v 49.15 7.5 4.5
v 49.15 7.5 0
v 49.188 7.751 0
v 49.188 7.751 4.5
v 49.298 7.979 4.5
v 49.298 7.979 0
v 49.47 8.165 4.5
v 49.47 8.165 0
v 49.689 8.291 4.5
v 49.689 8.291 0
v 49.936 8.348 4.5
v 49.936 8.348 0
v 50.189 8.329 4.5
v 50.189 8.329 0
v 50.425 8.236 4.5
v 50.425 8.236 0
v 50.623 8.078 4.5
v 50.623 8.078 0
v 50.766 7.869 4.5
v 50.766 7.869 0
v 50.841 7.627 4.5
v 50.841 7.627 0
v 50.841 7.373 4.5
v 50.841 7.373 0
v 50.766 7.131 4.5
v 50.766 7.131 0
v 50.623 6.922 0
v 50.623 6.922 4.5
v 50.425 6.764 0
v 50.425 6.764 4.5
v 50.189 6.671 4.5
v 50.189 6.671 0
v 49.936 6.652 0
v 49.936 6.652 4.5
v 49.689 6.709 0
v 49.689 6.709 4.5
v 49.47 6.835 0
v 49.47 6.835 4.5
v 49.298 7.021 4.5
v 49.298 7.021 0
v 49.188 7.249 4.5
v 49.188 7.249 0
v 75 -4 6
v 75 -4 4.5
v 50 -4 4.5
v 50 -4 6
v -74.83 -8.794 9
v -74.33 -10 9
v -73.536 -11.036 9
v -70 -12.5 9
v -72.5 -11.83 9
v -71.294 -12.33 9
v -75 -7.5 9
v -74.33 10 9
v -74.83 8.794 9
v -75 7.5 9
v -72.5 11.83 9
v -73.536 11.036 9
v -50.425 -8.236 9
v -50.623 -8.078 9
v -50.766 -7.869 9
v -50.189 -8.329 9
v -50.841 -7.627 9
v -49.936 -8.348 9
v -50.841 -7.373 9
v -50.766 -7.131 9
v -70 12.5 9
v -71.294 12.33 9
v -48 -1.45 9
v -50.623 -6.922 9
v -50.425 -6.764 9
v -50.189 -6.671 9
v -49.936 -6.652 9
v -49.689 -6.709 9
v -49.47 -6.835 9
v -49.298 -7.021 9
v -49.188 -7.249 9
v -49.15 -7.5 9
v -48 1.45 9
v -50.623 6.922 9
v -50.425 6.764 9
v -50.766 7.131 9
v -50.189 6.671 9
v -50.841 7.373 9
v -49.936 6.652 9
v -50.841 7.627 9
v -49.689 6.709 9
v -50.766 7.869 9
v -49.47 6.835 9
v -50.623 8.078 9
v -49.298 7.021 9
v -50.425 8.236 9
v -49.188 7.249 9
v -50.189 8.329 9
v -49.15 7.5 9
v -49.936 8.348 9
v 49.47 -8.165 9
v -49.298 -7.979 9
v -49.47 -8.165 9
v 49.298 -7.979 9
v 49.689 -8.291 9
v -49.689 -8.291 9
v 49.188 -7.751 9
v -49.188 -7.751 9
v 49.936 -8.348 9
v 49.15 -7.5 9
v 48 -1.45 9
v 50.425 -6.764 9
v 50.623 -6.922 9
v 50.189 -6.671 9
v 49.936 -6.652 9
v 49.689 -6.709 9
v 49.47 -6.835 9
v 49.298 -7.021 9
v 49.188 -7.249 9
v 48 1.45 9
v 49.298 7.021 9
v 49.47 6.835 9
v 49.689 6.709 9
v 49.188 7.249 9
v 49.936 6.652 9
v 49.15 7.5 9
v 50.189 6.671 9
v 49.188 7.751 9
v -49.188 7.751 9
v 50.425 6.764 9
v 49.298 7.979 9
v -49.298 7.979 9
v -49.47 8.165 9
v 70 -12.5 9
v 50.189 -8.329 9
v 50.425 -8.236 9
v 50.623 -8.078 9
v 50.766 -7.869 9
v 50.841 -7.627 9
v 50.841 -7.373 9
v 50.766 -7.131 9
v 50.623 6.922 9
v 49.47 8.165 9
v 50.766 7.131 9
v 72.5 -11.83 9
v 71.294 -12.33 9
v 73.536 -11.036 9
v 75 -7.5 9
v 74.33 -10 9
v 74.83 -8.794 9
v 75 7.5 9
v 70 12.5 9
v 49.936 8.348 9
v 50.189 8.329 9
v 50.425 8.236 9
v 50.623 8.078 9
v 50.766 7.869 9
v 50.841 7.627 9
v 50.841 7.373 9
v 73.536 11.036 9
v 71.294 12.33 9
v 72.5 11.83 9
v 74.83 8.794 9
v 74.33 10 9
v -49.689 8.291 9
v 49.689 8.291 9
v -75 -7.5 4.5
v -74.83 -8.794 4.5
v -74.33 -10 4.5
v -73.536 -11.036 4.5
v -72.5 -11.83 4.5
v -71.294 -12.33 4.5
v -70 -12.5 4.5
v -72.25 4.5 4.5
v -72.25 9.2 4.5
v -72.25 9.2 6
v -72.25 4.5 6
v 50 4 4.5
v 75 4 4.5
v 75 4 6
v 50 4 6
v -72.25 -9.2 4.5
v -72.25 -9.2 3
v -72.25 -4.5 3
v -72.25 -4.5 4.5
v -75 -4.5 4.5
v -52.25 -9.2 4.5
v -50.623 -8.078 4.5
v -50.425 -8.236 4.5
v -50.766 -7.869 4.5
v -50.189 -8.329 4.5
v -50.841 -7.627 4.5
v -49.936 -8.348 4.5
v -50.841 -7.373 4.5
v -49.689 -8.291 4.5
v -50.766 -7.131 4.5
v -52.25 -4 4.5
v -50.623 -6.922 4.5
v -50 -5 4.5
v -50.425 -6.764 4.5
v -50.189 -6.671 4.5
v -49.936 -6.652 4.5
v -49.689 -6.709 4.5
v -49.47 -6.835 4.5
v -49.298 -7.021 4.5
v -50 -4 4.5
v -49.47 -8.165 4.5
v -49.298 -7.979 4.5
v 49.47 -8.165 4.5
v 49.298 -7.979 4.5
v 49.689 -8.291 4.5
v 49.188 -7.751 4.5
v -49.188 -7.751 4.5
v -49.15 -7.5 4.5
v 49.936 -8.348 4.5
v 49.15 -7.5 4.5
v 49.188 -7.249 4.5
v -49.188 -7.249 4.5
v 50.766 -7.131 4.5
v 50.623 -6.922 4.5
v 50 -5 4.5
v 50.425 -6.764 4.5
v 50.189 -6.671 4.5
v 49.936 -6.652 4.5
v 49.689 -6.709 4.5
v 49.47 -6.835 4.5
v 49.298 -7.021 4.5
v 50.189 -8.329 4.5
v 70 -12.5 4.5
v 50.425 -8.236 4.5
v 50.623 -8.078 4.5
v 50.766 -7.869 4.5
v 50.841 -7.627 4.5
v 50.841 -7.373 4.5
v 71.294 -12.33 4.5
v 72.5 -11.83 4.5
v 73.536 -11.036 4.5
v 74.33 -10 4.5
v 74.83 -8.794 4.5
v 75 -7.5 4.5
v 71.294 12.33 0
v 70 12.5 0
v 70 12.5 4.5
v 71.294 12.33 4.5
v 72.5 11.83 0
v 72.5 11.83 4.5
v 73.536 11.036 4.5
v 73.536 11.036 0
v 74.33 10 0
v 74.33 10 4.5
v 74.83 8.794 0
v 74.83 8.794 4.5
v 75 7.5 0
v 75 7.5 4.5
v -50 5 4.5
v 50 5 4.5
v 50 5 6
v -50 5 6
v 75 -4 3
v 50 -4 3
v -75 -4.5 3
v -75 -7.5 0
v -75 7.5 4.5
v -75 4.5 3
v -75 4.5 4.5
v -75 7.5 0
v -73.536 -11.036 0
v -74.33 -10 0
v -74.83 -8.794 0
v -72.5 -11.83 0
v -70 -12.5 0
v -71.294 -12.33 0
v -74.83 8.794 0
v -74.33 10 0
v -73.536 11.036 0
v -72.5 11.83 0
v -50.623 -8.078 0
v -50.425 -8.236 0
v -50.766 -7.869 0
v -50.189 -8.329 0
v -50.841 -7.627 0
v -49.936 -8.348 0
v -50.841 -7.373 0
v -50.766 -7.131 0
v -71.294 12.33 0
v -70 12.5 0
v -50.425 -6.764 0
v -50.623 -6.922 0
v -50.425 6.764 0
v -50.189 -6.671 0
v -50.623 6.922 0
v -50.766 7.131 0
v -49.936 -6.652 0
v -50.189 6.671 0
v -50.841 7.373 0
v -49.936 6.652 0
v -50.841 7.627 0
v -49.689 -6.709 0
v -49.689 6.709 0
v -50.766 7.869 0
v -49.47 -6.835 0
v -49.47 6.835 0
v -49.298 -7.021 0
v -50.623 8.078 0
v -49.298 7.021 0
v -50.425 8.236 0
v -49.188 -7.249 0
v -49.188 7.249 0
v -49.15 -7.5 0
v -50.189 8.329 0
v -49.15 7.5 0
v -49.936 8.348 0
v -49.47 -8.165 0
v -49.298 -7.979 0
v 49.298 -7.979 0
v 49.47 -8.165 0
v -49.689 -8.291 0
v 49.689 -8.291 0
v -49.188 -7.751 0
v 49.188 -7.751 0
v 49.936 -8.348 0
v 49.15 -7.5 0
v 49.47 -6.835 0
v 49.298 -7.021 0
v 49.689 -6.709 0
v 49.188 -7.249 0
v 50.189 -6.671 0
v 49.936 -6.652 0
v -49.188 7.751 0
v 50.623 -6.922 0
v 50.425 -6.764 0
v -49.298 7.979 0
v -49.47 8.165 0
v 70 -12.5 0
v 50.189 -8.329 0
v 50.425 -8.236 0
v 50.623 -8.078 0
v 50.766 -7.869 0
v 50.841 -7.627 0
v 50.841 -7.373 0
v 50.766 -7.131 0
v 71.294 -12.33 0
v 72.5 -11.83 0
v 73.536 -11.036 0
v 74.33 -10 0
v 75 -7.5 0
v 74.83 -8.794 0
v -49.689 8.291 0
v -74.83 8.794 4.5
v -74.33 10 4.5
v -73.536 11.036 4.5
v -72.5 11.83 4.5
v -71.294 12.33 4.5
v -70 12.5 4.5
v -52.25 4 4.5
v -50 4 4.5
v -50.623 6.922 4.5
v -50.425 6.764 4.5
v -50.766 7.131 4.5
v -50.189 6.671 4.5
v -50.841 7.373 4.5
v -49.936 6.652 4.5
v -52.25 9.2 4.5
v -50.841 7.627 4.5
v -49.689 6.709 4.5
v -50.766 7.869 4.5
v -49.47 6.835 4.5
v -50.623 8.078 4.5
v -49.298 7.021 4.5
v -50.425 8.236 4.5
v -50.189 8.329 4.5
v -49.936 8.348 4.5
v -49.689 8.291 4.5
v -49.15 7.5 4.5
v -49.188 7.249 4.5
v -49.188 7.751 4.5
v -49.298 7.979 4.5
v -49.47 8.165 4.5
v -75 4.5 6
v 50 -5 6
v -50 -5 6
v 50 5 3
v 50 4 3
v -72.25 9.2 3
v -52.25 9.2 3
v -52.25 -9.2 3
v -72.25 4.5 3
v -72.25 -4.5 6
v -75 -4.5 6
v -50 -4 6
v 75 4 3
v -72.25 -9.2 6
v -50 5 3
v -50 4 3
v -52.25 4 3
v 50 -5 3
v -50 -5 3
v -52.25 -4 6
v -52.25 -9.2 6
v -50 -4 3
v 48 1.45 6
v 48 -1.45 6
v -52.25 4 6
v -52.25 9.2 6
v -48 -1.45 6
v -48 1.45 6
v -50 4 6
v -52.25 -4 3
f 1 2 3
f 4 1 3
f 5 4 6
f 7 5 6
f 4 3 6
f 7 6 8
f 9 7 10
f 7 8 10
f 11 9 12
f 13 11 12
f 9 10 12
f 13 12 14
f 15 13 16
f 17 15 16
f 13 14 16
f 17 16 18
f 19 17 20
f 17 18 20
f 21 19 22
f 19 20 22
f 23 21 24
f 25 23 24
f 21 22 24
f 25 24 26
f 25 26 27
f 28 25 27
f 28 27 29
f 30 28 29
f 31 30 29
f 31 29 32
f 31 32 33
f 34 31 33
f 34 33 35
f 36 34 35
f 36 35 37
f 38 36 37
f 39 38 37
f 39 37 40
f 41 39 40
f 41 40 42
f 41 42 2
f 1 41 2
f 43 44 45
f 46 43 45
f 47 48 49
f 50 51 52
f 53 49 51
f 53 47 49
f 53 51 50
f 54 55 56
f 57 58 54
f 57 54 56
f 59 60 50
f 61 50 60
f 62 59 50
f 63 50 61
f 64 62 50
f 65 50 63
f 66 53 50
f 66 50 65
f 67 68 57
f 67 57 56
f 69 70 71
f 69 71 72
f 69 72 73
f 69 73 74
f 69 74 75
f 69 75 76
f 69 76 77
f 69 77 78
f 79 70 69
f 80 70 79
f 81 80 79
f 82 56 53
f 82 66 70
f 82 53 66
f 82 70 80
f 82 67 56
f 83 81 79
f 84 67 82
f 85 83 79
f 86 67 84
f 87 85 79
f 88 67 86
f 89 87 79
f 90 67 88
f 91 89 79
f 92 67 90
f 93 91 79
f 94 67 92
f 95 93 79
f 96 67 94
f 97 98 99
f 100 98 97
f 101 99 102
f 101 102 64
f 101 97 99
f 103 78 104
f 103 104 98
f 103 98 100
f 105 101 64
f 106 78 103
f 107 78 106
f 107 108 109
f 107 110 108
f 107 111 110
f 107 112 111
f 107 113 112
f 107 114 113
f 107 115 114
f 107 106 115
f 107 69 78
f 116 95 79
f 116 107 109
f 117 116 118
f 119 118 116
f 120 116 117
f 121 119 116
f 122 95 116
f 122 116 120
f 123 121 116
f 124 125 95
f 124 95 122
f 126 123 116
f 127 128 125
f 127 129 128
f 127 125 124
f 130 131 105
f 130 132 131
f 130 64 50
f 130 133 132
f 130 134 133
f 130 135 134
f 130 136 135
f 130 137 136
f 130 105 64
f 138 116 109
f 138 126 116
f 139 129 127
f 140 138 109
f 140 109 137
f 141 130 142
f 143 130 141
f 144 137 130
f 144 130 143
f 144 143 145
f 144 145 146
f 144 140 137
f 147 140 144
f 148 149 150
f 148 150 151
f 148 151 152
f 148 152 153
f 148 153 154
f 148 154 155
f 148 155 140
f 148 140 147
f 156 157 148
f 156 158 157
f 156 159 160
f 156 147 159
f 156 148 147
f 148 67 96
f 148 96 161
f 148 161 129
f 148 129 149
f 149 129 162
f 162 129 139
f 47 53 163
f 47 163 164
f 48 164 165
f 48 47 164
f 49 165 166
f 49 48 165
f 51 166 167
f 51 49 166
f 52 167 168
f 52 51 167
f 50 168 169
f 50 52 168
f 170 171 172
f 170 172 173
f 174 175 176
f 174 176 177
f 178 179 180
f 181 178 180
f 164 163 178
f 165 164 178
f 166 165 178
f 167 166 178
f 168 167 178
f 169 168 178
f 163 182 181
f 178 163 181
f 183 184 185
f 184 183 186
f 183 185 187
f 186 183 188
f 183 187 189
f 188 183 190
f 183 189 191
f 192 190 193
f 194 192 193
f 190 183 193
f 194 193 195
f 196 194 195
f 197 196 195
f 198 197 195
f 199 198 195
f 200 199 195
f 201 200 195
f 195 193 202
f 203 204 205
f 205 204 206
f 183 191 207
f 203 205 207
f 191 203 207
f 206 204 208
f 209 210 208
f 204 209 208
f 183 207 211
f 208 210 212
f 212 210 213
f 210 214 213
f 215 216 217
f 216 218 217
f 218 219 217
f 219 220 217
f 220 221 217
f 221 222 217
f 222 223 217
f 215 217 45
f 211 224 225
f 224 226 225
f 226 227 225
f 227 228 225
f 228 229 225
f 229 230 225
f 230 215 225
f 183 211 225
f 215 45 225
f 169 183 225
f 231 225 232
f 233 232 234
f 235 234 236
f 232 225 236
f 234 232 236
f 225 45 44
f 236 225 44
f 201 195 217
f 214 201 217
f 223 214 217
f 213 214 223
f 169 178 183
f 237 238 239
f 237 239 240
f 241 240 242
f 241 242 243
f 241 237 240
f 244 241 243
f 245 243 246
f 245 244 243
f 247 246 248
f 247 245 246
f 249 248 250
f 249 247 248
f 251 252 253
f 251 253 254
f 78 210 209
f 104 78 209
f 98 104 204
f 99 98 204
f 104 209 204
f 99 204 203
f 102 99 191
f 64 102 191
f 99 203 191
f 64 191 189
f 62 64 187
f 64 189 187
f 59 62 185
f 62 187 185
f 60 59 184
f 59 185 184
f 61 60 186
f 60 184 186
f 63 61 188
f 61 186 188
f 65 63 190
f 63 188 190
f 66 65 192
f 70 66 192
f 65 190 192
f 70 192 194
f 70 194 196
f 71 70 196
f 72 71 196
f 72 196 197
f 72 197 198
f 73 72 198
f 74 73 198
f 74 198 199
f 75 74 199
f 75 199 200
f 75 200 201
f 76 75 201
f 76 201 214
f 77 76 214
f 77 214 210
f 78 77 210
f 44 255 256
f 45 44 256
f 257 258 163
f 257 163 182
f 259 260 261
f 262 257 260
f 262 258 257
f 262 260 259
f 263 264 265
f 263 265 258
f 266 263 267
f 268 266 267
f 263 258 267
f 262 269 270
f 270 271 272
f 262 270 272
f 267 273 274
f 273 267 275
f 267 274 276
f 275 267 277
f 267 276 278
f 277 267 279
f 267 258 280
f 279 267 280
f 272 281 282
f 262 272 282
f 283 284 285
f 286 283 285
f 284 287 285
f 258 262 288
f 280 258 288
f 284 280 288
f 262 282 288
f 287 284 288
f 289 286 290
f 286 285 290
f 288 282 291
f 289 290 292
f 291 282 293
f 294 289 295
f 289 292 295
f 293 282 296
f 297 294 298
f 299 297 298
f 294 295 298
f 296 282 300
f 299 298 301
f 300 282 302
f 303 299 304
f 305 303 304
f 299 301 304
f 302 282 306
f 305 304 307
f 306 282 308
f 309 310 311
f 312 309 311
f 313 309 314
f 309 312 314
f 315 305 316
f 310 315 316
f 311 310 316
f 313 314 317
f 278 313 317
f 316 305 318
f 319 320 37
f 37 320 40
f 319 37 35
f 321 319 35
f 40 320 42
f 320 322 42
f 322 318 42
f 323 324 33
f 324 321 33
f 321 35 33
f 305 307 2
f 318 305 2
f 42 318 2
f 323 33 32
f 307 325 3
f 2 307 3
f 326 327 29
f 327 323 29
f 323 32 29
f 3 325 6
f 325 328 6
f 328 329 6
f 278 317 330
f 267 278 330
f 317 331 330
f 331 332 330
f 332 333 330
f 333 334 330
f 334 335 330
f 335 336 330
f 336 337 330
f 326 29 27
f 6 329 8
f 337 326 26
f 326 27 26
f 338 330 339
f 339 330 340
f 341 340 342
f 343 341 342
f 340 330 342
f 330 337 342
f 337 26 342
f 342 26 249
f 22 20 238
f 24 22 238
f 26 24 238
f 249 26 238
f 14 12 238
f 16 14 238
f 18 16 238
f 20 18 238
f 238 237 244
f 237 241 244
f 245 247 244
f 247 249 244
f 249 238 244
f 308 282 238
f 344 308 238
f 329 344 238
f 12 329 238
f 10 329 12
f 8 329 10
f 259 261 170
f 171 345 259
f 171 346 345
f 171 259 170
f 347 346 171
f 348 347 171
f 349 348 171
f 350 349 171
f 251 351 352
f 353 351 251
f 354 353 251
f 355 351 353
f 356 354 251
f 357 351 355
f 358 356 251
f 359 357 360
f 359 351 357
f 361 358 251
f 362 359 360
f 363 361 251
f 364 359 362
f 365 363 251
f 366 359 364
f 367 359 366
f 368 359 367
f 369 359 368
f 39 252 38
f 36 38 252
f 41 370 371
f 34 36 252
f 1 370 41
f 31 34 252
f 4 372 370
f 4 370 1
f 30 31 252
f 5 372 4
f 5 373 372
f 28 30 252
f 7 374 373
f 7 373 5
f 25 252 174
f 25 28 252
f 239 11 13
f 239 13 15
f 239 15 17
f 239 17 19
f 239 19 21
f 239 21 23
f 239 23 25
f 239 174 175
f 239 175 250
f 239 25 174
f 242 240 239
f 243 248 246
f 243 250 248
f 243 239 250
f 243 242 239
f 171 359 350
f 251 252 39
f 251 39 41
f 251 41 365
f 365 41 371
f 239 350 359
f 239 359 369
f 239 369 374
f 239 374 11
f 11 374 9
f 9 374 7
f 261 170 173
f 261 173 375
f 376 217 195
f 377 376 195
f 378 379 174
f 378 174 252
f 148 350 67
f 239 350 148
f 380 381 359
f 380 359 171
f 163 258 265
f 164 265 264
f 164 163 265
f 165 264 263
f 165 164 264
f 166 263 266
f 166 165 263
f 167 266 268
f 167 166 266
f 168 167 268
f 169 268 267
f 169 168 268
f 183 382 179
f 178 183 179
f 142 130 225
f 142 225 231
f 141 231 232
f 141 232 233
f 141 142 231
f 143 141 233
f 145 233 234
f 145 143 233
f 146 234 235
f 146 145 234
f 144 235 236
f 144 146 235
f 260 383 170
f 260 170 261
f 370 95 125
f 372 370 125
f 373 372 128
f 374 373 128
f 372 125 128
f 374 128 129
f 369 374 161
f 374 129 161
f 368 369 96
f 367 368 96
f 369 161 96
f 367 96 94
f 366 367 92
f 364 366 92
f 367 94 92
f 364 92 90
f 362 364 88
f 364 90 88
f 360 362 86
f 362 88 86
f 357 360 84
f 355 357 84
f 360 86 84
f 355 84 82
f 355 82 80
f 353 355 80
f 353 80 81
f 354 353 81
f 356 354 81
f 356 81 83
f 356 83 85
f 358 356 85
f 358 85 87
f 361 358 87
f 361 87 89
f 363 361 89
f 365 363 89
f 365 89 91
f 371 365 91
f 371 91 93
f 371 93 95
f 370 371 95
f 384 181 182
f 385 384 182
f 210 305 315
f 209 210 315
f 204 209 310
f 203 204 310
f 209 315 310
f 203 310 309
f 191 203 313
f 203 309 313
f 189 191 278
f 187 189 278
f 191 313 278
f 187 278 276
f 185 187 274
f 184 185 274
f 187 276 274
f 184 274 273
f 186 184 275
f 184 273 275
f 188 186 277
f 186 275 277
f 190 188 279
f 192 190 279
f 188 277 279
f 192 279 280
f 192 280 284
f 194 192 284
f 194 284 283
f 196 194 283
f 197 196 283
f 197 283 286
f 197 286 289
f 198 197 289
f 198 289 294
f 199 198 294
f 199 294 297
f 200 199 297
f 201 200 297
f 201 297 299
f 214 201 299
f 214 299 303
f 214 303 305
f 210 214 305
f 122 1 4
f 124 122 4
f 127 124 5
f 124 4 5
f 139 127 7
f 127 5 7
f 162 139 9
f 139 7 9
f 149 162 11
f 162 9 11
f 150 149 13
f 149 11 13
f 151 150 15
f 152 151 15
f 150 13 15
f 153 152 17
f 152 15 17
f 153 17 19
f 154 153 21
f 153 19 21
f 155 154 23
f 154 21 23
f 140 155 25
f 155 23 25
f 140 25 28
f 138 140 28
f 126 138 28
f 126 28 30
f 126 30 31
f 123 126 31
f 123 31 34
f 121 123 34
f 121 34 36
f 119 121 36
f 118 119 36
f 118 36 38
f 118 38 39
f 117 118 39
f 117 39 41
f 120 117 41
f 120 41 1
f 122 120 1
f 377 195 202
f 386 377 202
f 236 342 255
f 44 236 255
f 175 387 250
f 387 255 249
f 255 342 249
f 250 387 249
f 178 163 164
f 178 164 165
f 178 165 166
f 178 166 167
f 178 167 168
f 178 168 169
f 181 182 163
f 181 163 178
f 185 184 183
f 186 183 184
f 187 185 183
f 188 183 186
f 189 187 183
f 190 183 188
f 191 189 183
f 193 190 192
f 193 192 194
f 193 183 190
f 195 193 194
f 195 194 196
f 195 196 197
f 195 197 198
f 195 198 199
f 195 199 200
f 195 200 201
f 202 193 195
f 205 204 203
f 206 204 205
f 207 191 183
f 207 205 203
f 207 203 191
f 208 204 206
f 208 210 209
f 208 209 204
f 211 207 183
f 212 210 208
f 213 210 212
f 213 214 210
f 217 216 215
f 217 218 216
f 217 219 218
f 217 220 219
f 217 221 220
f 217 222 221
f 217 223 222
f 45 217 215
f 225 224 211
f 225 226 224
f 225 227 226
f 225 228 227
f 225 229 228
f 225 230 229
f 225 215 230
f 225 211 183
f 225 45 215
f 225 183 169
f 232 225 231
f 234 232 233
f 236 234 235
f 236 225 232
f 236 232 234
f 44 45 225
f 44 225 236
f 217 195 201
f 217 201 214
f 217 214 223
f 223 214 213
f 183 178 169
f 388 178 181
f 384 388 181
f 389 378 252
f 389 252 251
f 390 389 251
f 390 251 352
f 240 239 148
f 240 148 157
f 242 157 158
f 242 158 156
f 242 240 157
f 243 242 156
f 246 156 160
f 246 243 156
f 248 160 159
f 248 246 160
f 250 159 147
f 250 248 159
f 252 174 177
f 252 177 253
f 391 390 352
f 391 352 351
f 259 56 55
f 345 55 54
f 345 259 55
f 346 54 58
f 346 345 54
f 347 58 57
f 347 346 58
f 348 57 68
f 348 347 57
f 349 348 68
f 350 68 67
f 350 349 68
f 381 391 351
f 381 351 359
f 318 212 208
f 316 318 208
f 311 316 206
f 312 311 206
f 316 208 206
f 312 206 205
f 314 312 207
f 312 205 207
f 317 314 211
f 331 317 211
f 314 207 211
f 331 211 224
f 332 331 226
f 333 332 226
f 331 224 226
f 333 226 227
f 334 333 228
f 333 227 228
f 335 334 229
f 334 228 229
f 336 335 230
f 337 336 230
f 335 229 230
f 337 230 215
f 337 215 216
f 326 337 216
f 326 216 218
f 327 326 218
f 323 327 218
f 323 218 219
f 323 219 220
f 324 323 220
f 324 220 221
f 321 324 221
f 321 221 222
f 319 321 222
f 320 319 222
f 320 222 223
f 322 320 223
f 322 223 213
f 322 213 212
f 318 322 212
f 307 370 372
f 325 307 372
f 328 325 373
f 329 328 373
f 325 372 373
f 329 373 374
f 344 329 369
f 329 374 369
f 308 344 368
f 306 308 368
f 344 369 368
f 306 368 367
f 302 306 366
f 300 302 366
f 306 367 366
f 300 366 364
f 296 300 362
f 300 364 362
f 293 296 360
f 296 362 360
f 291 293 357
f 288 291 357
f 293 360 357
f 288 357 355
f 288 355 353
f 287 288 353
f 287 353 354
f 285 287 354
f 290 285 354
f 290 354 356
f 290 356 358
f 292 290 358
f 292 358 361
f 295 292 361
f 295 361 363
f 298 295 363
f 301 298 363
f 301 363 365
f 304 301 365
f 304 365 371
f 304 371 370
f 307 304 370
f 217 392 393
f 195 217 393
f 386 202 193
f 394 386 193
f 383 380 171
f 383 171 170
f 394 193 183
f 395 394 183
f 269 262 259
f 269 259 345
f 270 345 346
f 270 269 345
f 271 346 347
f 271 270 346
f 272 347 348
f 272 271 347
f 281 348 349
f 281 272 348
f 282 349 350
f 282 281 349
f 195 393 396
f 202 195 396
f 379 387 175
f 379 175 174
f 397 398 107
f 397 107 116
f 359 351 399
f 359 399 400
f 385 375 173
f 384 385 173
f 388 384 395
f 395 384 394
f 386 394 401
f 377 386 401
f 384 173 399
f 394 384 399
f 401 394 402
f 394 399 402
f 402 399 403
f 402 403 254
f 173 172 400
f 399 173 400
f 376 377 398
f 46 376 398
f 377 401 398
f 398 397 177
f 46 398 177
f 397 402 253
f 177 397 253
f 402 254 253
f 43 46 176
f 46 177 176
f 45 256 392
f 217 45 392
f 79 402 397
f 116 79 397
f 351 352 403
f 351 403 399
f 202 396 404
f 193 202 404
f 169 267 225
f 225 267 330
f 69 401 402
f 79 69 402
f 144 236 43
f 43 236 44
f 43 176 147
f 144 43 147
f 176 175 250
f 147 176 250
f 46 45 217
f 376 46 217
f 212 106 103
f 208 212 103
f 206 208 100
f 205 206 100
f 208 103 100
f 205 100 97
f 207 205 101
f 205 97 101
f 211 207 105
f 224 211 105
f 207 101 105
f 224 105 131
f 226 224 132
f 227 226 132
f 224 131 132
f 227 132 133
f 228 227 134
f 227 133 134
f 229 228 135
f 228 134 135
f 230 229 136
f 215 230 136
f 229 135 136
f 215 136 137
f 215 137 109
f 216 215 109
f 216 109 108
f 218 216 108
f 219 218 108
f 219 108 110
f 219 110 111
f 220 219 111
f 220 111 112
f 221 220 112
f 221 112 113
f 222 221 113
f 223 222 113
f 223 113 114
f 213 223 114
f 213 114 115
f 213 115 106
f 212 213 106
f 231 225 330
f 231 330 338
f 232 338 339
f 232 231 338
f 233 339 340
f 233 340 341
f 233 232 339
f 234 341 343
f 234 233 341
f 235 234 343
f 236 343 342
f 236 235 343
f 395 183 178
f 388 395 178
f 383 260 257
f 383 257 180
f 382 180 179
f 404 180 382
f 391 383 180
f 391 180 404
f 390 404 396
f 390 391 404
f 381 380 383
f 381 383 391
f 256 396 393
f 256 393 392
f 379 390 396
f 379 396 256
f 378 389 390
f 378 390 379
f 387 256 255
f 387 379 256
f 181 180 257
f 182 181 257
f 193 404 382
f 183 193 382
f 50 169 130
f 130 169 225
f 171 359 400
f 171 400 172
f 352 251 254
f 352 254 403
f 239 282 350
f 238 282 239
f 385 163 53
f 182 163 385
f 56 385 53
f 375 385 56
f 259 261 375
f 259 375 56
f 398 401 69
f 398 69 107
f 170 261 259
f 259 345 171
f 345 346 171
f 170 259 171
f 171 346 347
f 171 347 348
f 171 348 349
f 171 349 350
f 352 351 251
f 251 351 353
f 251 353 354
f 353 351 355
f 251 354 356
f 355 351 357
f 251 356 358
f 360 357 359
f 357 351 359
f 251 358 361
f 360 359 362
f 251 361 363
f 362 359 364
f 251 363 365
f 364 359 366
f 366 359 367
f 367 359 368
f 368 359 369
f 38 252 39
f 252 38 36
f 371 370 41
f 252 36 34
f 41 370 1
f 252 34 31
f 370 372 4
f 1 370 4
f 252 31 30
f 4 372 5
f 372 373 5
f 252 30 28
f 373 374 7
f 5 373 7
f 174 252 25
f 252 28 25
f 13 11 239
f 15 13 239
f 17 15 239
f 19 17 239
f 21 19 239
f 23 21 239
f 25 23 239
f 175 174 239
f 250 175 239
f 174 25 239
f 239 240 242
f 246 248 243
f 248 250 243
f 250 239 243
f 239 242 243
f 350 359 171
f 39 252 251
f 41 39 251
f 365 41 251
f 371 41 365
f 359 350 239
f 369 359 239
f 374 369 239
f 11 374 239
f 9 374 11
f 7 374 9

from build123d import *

# Parameters (mm, degrees)
BOX_BOTTOM_HALF_0_W     = 152
BOX_BOTTOM_HALF_0_H     = 27
BOX_BOTTOM_HALF_0_DEPTH = 5.5
SKETCH_W                = 150
SKETCH_H                = 25
PAD_DEPTH               = 3
PAD001_DEPTH            = 3
SKETCH004_W             = 150
SKETCH004_H             = 25
SKETCH004_W_2           = 96
SKETCH004_H_2           = 2.9
PAD002_DEPTH            = 3
SKETCH005_R             = 0.85
POCKET_DEPTH            = 313.671314
POLARPATTERN_COUNT      = 2
POLARPATTERN001_COUNT   = 2
POLARPATTERN002_COUNT   = 2
FILLET_R                = 5


with BuildPart() as box_bottom_half_0_body:
    # box_bottom_half_0 → box_bottom_half_0 (new body)
    with BuildSketch(Plane(origin=(-76, -13.5, -1), x_dir=(1, 0, 0), z_dir=(0, 0, 1))):
        with Locations((76, 13.5)):
            Rectangle(BOX_BOTTOM_HALF_0_W, BOX_BOTTOM_HALF_0_H)
    extrude(amount=BOX_BOTTOM_HALF_0_DEPTH)


with BuildPart() as body:
    # Sketch → Pad (new body)
    with BuildSketch(Plane.XY):
        Rectangle(SKETCH_W, SKETCH_H)
    extrude(amount=PAD_DEPTH)

    # Sketch001 (on Face6 of Pad) → Pad001 (join)
    with BuildSketch(Plane.XY.offset(3)):
        Polygon((-75, 12.5), (75, 12.5), (75, 4), (50, 4), (50, 5), (-50, 5), (-50, 4), (-52.25, 4), (-52.25, 9.2), (-72.25, 9.2), (-72.25, 4.5), (-75, 4.5), align=None)
        Polygon((-75, -12.5), (75, -12.5), (75, -4), (50, -4), (50, -5), (-50, -5), (-50, -4), (-52.25, -4), (-52.25, -9.2), (-72.25, -9.2), (-72.25, -4.5), (-75, -4.5), align=None)
    extrude(amount=PAD001_DEPTH)

    # Sketch004 (on Face12 of Pad001) → Pad002 (join)
    with BuildSketch(Plane.XY.offset(6)):
        Rectangle(SKETCH004_W, SKETCH004_H)
        Rectangle(SKETCH004_W_2, SKETCH004_H_2, mode=Mode.SUBTRACT)
    extrude(amount=PAD002_DEPTH)

    # Sketch005 (on Face34 of Pad002) → Pocket (cut, through all)
    with BuildSketch(Plane.XY.offset(9)):
        with Locations((-50, 7.5)):
            Circle(SKETCH005_R)
    pocket = extrude(amount=-POCKET_DEPTH, mode=Mode.SUBTRACT)

    # PolarPattern: Pocket ×2 about axis
    polarpattern_axis = Axis((0, 0, 9), (0, 0, 1))
    for i in range(1, POLARPATTERN_COUNT):
        add(pocket.rotate(polarpattern_axis, i * 360 / POLARPATTERN_COUNT), mode=Mode.SUBTRACT)

    # PolarPattern001: Pocket ×2 about axis
    polarpattern001_axis = Axis((0, 0, 0), (0, 1, 0))
    for i in range(1, POLARPATTERN001_COUNT):
        add(pocket.rotate(polarpattern001_axis, i * 360 / POLARPATTERN001_COUNT), mode=Mode.SUBTRACT)

    # PolarPattern002: Pocket ×2 about axis
    polarpattern002_axis = Axis((0, 0, 0), (1, 0, 0))
    for i in range(1, POLARPATTERN002_COUNT):
        add(pocket.rotate(polarpattern002_axis, i * 360 / POLARPATTERN002_COUNT), mode=Mode.SUBTRACT)

    # Fillet
    fillet_edges = [body.edges().sort_by_distance(p)[0] for p in [
        (75, -12.5, 7.5),
        (75, 12.5, 7.5),
        (-75, -12.5, 7.5),
        (-75, 12.5, 7.5),
    ]]
    fillet(fillet_edges, radius=FILLET_R)


with BuildPart() as bottom_half_0_body:
    # bottom_half_0 base: copy of Body
    add(body.part)

    # bottom_half_0: intersect box_bottom_half_0 body
    add(box_bottom_half_0_body.part, mode=Mode.INTERSECT)


with BuildPart() as top_half_0_body:
    # top_half_0 base: copy of Body
    add(body.part)

    # top_half_0: cut box_bottom_half_0 body
    add(box_bottom_half_0_body.part, mode=Mode.SUBTRACT)


solid = Compound([bottom_half_0_body.part, top_half_0_body.part])
